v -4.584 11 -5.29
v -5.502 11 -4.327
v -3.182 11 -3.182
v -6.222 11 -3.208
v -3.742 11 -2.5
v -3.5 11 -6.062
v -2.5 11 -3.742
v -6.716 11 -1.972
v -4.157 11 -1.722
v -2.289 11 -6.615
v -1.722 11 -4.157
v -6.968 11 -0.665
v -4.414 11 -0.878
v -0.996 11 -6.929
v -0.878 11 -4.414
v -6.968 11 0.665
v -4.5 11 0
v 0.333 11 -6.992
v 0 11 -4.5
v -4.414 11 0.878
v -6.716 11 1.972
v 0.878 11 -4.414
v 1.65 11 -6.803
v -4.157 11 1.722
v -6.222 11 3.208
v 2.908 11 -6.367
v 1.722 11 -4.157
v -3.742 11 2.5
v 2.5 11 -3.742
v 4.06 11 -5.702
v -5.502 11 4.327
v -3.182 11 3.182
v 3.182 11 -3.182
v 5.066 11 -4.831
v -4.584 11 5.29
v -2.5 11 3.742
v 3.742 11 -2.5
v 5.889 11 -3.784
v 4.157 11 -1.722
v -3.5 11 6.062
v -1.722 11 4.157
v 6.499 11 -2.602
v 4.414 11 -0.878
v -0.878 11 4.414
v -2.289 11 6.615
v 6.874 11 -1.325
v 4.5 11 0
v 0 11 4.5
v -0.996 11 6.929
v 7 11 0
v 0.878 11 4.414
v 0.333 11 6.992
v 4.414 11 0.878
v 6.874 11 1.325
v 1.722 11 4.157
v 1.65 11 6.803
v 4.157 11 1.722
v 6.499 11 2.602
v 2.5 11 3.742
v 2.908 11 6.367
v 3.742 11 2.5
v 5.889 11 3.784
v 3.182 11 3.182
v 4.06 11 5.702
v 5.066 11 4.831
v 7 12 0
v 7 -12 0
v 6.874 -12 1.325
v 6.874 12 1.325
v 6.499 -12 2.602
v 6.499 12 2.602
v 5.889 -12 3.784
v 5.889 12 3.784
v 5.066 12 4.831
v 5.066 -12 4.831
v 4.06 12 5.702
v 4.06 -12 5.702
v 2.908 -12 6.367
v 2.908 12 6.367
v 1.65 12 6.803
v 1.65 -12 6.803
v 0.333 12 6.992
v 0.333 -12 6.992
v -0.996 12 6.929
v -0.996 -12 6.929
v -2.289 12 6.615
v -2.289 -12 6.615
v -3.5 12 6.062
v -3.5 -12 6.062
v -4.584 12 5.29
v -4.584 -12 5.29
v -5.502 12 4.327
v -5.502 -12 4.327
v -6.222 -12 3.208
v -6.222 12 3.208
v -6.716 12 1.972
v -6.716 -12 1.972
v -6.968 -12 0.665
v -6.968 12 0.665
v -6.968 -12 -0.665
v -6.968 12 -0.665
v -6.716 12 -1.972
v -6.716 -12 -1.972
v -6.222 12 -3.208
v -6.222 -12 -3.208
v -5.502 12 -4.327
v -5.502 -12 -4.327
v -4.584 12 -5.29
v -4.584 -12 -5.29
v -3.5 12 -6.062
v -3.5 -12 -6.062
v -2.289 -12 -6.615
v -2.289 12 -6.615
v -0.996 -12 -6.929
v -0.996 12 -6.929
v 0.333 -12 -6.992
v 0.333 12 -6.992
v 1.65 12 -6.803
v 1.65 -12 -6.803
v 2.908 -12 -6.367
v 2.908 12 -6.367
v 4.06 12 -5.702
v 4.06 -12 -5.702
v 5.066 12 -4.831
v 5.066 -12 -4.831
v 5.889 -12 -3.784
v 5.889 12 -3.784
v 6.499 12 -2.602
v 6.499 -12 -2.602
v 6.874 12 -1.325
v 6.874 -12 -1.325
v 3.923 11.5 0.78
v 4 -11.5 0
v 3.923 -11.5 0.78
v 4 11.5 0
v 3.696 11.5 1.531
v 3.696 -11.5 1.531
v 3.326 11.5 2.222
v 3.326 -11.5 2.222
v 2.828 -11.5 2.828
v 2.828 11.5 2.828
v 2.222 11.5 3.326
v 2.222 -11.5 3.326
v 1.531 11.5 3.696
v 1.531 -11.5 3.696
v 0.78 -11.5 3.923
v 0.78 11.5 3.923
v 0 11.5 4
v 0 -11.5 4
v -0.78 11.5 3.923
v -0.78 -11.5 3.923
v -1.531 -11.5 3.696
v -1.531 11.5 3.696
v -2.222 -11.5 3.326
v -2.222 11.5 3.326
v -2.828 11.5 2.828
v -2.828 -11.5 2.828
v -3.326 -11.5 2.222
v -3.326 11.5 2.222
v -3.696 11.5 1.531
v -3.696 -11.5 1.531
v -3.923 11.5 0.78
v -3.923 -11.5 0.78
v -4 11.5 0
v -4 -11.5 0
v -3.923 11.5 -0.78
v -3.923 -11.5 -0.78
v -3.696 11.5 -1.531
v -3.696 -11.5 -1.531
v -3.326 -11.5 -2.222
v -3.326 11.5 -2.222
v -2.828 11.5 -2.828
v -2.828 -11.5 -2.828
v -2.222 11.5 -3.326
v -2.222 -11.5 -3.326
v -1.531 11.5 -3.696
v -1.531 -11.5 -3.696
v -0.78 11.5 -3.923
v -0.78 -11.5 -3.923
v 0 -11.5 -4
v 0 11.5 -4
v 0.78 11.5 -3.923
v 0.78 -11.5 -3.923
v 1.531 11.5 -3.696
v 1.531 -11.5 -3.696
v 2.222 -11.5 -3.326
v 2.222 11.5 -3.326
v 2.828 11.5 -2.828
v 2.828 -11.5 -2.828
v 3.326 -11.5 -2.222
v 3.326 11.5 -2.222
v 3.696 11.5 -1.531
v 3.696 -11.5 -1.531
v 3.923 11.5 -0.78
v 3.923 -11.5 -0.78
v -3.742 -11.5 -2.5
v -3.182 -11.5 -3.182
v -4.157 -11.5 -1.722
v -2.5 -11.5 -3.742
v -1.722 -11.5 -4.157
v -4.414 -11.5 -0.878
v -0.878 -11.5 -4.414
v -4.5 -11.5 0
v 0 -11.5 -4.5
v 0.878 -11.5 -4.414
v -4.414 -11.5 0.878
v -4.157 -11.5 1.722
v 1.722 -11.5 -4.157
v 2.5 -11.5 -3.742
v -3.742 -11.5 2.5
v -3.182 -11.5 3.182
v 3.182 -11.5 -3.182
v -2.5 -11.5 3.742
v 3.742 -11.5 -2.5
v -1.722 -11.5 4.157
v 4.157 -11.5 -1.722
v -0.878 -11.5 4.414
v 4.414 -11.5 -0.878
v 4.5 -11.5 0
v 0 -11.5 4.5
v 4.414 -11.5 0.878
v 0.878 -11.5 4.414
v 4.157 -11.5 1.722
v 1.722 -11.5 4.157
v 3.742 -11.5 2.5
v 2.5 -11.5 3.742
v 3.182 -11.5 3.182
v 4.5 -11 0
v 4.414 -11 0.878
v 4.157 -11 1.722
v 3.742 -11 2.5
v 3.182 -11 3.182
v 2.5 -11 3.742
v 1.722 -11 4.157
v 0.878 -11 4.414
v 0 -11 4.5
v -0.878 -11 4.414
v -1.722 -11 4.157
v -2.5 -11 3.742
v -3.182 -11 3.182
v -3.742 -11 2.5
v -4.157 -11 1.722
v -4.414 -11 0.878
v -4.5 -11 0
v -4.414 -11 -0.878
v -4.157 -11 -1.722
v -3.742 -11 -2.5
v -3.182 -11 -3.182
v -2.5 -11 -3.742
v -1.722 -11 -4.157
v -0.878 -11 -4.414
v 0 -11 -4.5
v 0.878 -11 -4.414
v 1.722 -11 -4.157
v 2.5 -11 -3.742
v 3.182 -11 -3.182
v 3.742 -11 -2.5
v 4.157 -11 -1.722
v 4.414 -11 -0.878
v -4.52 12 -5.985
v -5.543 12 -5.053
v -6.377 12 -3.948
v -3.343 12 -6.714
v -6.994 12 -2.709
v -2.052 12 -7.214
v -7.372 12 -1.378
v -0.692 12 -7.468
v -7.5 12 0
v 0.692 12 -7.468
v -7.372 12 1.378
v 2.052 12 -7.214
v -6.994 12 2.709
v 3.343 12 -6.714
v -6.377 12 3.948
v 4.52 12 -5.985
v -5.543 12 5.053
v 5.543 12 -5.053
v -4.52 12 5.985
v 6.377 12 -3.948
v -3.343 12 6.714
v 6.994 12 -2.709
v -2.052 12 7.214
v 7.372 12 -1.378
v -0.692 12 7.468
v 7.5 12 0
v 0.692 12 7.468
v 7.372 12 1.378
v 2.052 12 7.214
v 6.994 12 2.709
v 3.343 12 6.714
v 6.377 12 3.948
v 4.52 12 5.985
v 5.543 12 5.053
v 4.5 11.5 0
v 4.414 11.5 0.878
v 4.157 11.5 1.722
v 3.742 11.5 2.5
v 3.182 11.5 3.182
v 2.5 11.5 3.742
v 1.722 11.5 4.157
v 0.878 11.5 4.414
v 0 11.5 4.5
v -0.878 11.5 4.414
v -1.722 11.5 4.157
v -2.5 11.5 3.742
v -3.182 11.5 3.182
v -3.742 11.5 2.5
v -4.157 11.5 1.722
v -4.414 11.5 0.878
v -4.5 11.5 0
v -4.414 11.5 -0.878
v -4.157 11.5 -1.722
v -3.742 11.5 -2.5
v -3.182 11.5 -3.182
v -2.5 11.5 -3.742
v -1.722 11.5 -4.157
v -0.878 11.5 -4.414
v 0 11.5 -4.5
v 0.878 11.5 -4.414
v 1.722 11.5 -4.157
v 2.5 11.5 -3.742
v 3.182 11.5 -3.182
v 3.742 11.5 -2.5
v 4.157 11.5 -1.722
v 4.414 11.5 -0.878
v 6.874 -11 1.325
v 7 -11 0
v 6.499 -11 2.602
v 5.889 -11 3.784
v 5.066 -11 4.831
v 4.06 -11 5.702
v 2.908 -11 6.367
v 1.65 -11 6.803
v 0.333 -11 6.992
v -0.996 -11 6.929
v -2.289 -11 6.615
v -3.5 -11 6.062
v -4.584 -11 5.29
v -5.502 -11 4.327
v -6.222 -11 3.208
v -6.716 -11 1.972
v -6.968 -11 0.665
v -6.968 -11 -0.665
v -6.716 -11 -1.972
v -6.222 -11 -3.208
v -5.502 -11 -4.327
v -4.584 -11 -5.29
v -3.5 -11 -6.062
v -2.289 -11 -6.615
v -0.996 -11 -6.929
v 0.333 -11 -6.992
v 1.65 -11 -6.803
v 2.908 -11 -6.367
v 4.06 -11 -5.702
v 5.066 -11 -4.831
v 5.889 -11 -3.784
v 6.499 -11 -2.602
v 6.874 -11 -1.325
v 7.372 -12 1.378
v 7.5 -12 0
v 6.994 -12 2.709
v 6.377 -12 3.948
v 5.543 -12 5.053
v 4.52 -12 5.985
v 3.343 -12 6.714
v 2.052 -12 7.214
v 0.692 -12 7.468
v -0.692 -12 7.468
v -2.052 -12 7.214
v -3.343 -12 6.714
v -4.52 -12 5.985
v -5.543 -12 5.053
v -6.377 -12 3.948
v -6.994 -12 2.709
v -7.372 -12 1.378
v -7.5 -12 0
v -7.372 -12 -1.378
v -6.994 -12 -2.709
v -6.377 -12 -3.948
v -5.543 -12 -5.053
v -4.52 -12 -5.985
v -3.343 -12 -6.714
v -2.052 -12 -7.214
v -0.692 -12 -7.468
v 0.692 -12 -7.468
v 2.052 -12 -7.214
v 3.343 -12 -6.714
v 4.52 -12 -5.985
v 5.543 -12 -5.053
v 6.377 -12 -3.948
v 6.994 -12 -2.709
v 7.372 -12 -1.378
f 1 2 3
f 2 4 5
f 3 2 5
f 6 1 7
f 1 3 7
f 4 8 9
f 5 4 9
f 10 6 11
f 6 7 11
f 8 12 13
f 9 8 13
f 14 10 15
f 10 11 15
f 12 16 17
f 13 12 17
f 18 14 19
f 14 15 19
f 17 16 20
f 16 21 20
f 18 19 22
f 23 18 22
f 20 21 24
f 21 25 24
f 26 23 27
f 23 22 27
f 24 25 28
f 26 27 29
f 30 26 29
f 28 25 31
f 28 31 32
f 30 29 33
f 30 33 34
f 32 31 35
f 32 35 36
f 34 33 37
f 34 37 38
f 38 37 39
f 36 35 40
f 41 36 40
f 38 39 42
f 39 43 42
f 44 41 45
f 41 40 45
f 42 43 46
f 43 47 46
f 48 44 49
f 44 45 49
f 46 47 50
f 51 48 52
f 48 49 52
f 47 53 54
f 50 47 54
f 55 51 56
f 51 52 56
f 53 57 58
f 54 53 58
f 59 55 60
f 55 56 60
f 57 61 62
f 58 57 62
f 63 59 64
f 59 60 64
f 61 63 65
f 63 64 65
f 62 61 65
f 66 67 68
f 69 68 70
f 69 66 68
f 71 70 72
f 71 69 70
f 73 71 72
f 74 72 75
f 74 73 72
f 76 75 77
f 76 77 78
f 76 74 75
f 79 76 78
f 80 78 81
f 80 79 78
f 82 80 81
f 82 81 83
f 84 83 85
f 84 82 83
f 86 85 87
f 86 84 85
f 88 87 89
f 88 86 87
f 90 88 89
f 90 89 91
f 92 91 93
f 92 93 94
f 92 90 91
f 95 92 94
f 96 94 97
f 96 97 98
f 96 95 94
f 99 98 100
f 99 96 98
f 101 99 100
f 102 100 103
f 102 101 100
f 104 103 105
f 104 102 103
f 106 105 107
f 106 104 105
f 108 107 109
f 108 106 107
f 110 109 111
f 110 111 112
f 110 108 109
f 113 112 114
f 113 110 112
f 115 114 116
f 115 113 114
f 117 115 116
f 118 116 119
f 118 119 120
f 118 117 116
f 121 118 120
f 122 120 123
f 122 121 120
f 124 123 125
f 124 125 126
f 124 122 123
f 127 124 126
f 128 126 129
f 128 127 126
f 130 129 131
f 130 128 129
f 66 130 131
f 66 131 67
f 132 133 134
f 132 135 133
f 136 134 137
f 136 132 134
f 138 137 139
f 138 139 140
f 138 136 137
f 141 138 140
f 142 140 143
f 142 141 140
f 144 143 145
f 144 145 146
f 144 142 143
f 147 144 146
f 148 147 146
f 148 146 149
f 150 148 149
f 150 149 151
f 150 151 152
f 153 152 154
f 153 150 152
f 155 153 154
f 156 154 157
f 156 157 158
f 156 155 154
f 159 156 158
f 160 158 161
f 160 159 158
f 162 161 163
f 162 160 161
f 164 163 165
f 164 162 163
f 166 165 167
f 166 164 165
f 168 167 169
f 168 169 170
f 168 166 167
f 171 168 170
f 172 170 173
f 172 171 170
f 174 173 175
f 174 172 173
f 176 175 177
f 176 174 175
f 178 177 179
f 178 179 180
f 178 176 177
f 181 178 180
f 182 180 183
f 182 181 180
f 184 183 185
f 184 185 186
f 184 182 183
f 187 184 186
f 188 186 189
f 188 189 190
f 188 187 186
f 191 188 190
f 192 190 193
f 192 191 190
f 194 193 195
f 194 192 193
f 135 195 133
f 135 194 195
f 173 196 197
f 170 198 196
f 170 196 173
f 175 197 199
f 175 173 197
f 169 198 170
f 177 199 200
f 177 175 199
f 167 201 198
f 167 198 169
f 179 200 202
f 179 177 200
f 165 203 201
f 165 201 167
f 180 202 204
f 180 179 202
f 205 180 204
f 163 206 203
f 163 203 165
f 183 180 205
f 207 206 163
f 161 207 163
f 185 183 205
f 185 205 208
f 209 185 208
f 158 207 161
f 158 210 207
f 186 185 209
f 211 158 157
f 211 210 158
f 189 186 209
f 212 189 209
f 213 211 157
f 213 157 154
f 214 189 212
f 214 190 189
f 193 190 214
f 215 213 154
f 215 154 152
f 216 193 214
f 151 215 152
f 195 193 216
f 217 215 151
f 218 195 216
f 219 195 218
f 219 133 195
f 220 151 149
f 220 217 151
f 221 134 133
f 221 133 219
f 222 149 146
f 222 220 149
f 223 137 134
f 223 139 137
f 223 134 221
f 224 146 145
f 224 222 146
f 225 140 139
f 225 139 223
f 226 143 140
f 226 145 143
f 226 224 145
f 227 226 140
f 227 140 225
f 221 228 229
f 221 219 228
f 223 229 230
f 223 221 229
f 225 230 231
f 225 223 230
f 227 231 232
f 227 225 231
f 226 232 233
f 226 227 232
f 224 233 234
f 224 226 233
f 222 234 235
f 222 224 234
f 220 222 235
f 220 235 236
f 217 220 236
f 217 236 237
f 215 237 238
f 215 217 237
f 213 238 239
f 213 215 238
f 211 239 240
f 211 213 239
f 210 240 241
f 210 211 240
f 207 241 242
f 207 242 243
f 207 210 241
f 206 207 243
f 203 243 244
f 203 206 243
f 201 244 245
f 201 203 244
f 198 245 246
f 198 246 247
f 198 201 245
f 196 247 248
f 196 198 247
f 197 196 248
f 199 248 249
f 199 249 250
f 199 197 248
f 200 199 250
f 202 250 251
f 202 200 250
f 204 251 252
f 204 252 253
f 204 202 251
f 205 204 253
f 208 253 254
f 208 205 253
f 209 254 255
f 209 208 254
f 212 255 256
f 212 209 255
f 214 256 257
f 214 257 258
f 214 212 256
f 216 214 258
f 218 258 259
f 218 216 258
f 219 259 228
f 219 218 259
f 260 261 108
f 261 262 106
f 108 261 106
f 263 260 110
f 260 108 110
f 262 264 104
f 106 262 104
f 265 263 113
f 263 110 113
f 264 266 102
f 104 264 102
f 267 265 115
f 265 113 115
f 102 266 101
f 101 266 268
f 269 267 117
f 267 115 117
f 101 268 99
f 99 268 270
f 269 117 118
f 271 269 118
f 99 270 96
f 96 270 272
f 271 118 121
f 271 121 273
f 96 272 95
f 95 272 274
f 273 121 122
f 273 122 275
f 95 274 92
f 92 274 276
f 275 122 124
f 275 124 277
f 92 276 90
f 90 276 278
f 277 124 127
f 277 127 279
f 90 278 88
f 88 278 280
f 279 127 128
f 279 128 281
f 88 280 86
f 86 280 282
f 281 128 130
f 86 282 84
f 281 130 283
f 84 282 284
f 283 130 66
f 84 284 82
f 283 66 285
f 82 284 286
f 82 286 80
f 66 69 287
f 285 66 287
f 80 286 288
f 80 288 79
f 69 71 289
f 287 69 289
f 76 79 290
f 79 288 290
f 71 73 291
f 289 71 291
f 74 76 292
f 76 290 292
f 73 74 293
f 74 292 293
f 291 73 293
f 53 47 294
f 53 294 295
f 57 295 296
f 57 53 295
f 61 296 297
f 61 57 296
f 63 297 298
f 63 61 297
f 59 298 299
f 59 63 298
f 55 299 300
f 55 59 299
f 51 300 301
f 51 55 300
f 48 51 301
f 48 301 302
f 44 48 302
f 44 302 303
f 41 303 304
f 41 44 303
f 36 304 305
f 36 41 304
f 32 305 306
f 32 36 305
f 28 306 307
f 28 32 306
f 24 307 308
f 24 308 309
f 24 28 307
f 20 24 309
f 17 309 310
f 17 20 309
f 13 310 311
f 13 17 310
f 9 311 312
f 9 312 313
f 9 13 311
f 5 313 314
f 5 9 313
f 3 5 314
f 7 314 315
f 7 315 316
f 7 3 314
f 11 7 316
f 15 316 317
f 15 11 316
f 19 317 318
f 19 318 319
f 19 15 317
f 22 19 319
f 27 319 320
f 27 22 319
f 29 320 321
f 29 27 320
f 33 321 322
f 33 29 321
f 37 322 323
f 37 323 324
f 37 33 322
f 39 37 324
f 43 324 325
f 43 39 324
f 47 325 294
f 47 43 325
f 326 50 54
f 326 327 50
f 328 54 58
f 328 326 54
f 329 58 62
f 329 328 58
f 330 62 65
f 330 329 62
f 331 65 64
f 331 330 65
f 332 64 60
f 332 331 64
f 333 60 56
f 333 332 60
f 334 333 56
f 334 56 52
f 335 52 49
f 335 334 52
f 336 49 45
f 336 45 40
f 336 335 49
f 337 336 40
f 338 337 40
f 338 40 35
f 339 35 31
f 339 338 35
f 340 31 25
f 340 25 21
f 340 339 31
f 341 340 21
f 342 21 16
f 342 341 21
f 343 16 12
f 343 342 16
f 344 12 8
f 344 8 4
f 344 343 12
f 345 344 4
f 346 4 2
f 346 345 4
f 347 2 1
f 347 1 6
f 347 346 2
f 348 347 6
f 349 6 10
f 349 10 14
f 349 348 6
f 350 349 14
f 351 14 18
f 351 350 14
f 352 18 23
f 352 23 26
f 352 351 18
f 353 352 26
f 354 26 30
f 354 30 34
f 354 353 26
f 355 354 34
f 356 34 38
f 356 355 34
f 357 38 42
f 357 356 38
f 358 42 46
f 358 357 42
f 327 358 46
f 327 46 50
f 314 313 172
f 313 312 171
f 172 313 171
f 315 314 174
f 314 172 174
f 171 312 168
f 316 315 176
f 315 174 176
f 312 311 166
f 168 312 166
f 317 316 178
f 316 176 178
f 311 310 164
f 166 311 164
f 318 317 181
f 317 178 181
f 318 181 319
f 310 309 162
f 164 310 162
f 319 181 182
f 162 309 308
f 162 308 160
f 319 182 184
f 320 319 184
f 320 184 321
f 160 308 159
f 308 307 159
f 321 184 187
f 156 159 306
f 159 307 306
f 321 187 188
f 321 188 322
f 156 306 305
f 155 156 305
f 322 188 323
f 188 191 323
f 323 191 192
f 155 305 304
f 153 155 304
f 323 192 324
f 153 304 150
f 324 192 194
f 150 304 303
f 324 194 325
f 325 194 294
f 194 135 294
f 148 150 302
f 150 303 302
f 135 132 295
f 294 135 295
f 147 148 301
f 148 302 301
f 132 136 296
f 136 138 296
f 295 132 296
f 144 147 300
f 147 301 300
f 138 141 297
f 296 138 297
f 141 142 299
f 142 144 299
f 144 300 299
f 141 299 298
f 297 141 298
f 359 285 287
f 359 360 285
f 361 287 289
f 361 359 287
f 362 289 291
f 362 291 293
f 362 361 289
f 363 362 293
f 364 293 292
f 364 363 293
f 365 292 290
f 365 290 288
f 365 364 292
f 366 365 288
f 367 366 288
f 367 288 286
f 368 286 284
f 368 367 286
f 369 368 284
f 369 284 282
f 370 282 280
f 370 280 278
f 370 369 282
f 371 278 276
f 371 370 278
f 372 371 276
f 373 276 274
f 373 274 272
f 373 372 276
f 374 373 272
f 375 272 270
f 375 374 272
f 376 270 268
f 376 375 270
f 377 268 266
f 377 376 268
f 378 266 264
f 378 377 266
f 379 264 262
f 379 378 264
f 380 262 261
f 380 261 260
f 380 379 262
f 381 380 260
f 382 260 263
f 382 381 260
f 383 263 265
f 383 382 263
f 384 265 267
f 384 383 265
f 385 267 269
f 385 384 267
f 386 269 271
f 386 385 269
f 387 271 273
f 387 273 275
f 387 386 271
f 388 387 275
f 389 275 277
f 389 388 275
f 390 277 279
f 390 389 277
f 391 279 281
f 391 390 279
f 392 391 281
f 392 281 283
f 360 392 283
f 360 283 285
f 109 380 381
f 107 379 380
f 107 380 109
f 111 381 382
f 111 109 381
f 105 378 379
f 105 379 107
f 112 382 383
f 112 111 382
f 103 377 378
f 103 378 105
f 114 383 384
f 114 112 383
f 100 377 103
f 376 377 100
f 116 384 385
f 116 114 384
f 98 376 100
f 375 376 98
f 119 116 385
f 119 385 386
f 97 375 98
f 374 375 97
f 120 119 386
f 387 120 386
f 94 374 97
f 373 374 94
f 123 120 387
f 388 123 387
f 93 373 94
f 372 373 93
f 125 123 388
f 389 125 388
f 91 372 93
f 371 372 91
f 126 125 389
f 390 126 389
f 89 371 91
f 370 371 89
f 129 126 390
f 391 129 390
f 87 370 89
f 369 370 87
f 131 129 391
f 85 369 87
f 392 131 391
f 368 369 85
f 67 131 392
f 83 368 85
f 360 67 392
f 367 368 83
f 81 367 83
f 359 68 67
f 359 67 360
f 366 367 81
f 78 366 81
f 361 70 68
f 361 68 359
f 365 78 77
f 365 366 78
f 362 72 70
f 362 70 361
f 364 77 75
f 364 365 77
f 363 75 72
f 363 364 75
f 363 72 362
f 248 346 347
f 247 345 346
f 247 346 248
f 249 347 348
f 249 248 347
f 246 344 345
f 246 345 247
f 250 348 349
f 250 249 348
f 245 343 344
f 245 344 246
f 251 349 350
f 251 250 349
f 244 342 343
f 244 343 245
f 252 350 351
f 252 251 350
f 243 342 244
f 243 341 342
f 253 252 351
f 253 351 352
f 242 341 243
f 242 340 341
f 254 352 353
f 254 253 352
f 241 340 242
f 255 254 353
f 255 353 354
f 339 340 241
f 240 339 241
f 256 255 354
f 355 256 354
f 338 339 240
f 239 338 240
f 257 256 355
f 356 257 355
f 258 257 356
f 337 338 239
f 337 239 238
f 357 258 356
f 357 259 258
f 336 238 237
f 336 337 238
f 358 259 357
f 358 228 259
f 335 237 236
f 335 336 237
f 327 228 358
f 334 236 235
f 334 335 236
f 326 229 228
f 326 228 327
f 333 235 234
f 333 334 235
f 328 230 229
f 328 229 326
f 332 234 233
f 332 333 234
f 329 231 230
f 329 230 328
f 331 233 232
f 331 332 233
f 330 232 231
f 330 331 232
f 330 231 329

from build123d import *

# Parameters (mm, degrees)
F0_R     = 7.5
F0_R_2   = 7
F1_DEPTH = 12
F0_R_3   = 4.5
F2_DEPTH = 11
F0_R_4   = 4
F3_DEPTH = 11.5


with BuildPart() as f1:
    # F0 (on Front) → F1 (new body, symmetric)
    with BuildSketch(Plane.XZ):
        Circle(F0_R)
        Circle(F0_R_2, mode=Mode.SUBTRACT)
    extrude(amount=F1_DEPTH, both=True)


with BuildPart() as f2:
    # F0 (on Front) → F2 (new body, symmetric)
    with BuildSketch(Plane.XZ):
        Circle(F0_R_2)
        Circle(F0_R_3, mode=Mode.SUBTRACT)
    extrude(amount=F2_DEPTH, both=True)

    # F0 (on Front) → F3 (join, symmetric)
    with BuildSketch(Plane.XZ):
        Circle(F0_R_3)
        Circle(F0_R_4, mode=Mode.SUBTRACT)
    extrude(amount=F3_DEPTH, both=True)


solid = Compound([f1.part, f2.part])
